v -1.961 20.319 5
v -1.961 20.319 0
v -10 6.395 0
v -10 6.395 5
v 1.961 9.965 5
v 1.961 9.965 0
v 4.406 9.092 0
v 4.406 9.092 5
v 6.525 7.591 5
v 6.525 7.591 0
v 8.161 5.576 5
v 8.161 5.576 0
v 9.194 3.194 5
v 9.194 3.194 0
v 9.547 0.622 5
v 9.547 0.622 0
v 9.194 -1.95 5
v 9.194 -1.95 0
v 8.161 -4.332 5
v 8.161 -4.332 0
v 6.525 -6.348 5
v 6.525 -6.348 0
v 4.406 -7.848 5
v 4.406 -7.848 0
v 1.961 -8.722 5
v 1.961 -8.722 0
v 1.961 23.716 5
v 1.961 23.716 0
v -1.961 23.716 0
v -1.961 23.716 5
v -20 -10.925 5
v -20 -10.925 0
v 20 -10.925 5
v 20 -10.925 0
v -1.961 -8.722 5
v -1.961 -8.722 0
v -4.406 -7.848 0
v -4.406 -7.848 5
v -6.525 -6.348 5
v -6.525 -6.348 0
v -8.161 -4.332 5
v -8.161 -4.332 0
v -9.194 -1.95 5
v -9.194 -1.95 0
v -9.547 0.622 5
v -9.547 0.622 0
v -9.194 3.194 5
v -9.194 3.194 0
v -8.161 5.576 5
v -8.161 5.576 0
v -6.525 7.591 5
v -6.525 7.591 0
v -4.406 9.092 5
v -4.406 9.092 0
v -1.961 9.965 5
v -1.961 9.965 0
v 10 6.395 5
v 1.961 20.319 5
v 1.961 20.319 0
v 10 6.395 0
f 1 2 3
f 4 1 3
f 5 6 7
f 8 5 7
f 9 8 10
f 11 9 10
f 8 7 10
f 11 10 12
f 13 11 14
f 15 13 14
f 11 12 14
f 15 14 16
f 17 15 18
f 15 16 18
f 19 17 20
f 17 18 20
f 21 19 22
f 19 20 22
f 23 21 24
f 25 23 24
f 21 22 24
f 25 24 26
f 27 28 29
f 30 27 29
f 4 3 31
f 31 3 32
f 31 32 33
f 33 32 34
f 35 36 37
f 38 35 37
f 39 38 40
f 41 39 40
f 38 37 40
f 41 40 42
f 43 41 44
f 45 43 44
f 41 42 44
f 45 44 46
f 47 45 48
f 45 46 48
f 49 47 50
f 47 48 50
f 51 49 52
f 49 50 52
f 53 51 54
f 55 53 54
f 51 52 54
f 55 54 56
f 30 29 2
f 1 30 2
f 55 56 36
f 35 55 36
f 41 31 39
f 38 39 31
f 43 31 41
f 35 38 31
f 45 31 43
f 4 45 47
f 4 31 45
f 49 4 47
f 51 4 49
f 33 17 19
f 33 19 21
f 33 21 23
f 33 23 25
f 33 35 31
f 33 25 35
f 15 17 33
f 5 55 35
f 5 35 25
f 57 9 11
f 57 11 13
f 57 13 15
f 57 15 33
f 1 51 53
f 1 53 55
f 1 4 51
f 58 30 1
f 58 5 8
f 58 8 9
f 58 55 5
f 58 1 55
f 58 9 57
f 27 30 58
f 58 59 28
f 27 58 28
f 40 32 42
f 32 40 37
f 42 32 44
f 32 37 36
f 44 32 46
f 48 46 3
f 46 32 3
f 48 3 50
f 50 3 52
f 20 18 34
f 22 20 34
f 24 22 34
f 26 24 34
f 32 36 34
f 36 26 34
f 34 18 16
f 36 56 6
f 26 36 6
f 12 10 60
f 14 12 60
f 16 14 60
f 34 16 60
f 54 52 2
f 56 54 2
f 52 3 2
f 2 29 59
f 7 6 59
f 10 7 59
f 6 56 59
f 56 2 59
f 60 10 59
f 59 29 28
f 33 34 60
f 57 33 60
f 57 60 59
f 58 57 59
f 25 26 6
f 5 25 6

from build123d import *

# Parameters (mm, degrees)
F1_DEPTH = 5


with BuildPart() as f1:
    # F0 (on Top) → F1 (new body)
    with BuildSketch(Plane.XY):
        with BuildLine():
            Line((-1.9610302988, 23.7158841491), (-1.9610302988, 20.3192800363))
            Line((-1.9610302988, 20.3192800363), (-10.0000000112, 6.3953760539))
            ThreePointArc((-10.0000000112, 6.3953760539), (-6.6047488214, 10.093442752), (-1.9610302988, 12.0011393288))
            Line((-1.9610302988, 12.0011393288), (-1.9610302988, 9.9653027286))
            Line((-1.9610302988, 9.9653027286), (-1.9610302988, -8.7215559657))
            Line((-1.9610302988, -8.7215559657), (-1.9610302988, -10.7573925659))
            ThreePointArc((-1.9610302988, -10.7573925659), (-0.9840955869, -10.8831207171), (-3.69e-08, -10.9251320023))
            ThreePointArc((-3.69e-08, -10.9251320023), (0.9840955501, -10.8831207203), (1.9610302988, -10.7573925659))
            Line((1.9610302988, -10.7573925659), (1.9610302988, -8.7215559657))
            Line((1.9610302988, -8.7215559657), (1.9610302988, 9.9653027286))
            Line((1.9610302988, 9.9653027286), (1.9610302988, 12.0011393288))
            ThreePointArc((1.9610302988, 12.0011393288), (6.6047486362, 10.0934428811), (9.9999997855, 6.3953764449))
            Line((9.9999997855, 6.3953764449), (1.9610302988, 20.3192800363))
            Line((1.9610302988, 20.3192800363), (1.9610302988, 23.7158841491))
            Line((1.9610302988, 23.7158841491), (-1.9610302988, 23.7158841491))
        make_face()
        with BuildLine():
            ThreePointArc((-1.9610302988, -10.7573925659), (-10.4556649406, -4.2783719167), (-10.0000000112, 6.3953760539))
            Line((-10.0000000112, 6.3953760539), (-20, -10.9251320023))
            Line((-20, -10.9251320023), (-1.9610302988, -10.9251320023))
            Line((-1.9610302988, -10.9251320023), (-1.9610302988, -10.7573925659))
        make_face()
        with BuildLine():
            ThreePointArc((-1.9610302988, 12.0011393288), (-6.6047488214, 10.093442752), (-10.0000000112, 6.3953760539))
            ThreePointArc((-10.0000000112, 6.3953760539), (-10.4556649406, -4.2783719167), (-1.9610302988, -10.7573925659))
            Line((-1.9610302988, -10.7573925659), (-1.9610302988, -8.7215559657))
            ThreePointArc((-1.9610302988, -8.7215559657), (-9.5470053838, 0.6218733815), (-1.9610302988, 9.9653027286))
            Line((-1.9610302988, 9.9653027286), (-1.9610302988, 12.0011393288))
        make_face()
        with BuildLine():
            ThreePointArc((-3.69e-08, -10.9251320023), (-0.9840955869, -10.8831207171), (-1.9610302988, -10.7573925659))
            Line((-1.9610302988, -10.7573925659), (-1.9610302988, -10.9251320023))
            Line((-1.9610302988, -10.9251320023), (-3.69e-08, -10.9251320023))
        make_face()
        with BuildLine():
            ThreePointArc((1.9610302988, -10.7573925659), (0.9840955501, -10.8831207203), (-3.69e-08, -10.9251320023))
            Line((-3.69e-08, -10.9251320023), (1.9610302988, -10.9251320023))
            Line((1.9610302988, -10.9251320023), (1.9610302988, -10.7573925659))
        make_face()
        with BuildLine():
            Line((1.9610302988, -10.7573925659), (1.9610302988, -10.9251320023))
            Line((1.9610302988, -10.9251320023), (20, -10.9251320023))
            Line((20, -10.9251320023), (9.9999997855, 6.3953764449))
            ThreePointArc((9.9999997855, 6.3953764449), (10.4556650364, -4.2783717123), (1.9610302988, -10.7573925659))
        make_face()
        with BuildLine():
            Line((1.9610302988, -8.7215559657), (1.9610302988, -10.7573925659))
            ThreePointArc((1.9610302988, -10.7573925659), (10.4556650364, -4.2783717123), (9.9999997855, 6.3953764449))
            ThreePointArc((9.9999997855, 6.3953764449), (6.6047486362, 10.0934428811), (1.9610302988, 12.0011393288))
            Line((1.9610302988, 12.0011393288), (1.9610302988, 9.9653027286))
            ThreePointArc((1.9610302988, 9.9653027286), (9.5470053838, 0.6218733815), (1.9610302988, -8.7215559657))
        make_face()
    extrude(amount=F1_DEPTH)


solid = f1.part
